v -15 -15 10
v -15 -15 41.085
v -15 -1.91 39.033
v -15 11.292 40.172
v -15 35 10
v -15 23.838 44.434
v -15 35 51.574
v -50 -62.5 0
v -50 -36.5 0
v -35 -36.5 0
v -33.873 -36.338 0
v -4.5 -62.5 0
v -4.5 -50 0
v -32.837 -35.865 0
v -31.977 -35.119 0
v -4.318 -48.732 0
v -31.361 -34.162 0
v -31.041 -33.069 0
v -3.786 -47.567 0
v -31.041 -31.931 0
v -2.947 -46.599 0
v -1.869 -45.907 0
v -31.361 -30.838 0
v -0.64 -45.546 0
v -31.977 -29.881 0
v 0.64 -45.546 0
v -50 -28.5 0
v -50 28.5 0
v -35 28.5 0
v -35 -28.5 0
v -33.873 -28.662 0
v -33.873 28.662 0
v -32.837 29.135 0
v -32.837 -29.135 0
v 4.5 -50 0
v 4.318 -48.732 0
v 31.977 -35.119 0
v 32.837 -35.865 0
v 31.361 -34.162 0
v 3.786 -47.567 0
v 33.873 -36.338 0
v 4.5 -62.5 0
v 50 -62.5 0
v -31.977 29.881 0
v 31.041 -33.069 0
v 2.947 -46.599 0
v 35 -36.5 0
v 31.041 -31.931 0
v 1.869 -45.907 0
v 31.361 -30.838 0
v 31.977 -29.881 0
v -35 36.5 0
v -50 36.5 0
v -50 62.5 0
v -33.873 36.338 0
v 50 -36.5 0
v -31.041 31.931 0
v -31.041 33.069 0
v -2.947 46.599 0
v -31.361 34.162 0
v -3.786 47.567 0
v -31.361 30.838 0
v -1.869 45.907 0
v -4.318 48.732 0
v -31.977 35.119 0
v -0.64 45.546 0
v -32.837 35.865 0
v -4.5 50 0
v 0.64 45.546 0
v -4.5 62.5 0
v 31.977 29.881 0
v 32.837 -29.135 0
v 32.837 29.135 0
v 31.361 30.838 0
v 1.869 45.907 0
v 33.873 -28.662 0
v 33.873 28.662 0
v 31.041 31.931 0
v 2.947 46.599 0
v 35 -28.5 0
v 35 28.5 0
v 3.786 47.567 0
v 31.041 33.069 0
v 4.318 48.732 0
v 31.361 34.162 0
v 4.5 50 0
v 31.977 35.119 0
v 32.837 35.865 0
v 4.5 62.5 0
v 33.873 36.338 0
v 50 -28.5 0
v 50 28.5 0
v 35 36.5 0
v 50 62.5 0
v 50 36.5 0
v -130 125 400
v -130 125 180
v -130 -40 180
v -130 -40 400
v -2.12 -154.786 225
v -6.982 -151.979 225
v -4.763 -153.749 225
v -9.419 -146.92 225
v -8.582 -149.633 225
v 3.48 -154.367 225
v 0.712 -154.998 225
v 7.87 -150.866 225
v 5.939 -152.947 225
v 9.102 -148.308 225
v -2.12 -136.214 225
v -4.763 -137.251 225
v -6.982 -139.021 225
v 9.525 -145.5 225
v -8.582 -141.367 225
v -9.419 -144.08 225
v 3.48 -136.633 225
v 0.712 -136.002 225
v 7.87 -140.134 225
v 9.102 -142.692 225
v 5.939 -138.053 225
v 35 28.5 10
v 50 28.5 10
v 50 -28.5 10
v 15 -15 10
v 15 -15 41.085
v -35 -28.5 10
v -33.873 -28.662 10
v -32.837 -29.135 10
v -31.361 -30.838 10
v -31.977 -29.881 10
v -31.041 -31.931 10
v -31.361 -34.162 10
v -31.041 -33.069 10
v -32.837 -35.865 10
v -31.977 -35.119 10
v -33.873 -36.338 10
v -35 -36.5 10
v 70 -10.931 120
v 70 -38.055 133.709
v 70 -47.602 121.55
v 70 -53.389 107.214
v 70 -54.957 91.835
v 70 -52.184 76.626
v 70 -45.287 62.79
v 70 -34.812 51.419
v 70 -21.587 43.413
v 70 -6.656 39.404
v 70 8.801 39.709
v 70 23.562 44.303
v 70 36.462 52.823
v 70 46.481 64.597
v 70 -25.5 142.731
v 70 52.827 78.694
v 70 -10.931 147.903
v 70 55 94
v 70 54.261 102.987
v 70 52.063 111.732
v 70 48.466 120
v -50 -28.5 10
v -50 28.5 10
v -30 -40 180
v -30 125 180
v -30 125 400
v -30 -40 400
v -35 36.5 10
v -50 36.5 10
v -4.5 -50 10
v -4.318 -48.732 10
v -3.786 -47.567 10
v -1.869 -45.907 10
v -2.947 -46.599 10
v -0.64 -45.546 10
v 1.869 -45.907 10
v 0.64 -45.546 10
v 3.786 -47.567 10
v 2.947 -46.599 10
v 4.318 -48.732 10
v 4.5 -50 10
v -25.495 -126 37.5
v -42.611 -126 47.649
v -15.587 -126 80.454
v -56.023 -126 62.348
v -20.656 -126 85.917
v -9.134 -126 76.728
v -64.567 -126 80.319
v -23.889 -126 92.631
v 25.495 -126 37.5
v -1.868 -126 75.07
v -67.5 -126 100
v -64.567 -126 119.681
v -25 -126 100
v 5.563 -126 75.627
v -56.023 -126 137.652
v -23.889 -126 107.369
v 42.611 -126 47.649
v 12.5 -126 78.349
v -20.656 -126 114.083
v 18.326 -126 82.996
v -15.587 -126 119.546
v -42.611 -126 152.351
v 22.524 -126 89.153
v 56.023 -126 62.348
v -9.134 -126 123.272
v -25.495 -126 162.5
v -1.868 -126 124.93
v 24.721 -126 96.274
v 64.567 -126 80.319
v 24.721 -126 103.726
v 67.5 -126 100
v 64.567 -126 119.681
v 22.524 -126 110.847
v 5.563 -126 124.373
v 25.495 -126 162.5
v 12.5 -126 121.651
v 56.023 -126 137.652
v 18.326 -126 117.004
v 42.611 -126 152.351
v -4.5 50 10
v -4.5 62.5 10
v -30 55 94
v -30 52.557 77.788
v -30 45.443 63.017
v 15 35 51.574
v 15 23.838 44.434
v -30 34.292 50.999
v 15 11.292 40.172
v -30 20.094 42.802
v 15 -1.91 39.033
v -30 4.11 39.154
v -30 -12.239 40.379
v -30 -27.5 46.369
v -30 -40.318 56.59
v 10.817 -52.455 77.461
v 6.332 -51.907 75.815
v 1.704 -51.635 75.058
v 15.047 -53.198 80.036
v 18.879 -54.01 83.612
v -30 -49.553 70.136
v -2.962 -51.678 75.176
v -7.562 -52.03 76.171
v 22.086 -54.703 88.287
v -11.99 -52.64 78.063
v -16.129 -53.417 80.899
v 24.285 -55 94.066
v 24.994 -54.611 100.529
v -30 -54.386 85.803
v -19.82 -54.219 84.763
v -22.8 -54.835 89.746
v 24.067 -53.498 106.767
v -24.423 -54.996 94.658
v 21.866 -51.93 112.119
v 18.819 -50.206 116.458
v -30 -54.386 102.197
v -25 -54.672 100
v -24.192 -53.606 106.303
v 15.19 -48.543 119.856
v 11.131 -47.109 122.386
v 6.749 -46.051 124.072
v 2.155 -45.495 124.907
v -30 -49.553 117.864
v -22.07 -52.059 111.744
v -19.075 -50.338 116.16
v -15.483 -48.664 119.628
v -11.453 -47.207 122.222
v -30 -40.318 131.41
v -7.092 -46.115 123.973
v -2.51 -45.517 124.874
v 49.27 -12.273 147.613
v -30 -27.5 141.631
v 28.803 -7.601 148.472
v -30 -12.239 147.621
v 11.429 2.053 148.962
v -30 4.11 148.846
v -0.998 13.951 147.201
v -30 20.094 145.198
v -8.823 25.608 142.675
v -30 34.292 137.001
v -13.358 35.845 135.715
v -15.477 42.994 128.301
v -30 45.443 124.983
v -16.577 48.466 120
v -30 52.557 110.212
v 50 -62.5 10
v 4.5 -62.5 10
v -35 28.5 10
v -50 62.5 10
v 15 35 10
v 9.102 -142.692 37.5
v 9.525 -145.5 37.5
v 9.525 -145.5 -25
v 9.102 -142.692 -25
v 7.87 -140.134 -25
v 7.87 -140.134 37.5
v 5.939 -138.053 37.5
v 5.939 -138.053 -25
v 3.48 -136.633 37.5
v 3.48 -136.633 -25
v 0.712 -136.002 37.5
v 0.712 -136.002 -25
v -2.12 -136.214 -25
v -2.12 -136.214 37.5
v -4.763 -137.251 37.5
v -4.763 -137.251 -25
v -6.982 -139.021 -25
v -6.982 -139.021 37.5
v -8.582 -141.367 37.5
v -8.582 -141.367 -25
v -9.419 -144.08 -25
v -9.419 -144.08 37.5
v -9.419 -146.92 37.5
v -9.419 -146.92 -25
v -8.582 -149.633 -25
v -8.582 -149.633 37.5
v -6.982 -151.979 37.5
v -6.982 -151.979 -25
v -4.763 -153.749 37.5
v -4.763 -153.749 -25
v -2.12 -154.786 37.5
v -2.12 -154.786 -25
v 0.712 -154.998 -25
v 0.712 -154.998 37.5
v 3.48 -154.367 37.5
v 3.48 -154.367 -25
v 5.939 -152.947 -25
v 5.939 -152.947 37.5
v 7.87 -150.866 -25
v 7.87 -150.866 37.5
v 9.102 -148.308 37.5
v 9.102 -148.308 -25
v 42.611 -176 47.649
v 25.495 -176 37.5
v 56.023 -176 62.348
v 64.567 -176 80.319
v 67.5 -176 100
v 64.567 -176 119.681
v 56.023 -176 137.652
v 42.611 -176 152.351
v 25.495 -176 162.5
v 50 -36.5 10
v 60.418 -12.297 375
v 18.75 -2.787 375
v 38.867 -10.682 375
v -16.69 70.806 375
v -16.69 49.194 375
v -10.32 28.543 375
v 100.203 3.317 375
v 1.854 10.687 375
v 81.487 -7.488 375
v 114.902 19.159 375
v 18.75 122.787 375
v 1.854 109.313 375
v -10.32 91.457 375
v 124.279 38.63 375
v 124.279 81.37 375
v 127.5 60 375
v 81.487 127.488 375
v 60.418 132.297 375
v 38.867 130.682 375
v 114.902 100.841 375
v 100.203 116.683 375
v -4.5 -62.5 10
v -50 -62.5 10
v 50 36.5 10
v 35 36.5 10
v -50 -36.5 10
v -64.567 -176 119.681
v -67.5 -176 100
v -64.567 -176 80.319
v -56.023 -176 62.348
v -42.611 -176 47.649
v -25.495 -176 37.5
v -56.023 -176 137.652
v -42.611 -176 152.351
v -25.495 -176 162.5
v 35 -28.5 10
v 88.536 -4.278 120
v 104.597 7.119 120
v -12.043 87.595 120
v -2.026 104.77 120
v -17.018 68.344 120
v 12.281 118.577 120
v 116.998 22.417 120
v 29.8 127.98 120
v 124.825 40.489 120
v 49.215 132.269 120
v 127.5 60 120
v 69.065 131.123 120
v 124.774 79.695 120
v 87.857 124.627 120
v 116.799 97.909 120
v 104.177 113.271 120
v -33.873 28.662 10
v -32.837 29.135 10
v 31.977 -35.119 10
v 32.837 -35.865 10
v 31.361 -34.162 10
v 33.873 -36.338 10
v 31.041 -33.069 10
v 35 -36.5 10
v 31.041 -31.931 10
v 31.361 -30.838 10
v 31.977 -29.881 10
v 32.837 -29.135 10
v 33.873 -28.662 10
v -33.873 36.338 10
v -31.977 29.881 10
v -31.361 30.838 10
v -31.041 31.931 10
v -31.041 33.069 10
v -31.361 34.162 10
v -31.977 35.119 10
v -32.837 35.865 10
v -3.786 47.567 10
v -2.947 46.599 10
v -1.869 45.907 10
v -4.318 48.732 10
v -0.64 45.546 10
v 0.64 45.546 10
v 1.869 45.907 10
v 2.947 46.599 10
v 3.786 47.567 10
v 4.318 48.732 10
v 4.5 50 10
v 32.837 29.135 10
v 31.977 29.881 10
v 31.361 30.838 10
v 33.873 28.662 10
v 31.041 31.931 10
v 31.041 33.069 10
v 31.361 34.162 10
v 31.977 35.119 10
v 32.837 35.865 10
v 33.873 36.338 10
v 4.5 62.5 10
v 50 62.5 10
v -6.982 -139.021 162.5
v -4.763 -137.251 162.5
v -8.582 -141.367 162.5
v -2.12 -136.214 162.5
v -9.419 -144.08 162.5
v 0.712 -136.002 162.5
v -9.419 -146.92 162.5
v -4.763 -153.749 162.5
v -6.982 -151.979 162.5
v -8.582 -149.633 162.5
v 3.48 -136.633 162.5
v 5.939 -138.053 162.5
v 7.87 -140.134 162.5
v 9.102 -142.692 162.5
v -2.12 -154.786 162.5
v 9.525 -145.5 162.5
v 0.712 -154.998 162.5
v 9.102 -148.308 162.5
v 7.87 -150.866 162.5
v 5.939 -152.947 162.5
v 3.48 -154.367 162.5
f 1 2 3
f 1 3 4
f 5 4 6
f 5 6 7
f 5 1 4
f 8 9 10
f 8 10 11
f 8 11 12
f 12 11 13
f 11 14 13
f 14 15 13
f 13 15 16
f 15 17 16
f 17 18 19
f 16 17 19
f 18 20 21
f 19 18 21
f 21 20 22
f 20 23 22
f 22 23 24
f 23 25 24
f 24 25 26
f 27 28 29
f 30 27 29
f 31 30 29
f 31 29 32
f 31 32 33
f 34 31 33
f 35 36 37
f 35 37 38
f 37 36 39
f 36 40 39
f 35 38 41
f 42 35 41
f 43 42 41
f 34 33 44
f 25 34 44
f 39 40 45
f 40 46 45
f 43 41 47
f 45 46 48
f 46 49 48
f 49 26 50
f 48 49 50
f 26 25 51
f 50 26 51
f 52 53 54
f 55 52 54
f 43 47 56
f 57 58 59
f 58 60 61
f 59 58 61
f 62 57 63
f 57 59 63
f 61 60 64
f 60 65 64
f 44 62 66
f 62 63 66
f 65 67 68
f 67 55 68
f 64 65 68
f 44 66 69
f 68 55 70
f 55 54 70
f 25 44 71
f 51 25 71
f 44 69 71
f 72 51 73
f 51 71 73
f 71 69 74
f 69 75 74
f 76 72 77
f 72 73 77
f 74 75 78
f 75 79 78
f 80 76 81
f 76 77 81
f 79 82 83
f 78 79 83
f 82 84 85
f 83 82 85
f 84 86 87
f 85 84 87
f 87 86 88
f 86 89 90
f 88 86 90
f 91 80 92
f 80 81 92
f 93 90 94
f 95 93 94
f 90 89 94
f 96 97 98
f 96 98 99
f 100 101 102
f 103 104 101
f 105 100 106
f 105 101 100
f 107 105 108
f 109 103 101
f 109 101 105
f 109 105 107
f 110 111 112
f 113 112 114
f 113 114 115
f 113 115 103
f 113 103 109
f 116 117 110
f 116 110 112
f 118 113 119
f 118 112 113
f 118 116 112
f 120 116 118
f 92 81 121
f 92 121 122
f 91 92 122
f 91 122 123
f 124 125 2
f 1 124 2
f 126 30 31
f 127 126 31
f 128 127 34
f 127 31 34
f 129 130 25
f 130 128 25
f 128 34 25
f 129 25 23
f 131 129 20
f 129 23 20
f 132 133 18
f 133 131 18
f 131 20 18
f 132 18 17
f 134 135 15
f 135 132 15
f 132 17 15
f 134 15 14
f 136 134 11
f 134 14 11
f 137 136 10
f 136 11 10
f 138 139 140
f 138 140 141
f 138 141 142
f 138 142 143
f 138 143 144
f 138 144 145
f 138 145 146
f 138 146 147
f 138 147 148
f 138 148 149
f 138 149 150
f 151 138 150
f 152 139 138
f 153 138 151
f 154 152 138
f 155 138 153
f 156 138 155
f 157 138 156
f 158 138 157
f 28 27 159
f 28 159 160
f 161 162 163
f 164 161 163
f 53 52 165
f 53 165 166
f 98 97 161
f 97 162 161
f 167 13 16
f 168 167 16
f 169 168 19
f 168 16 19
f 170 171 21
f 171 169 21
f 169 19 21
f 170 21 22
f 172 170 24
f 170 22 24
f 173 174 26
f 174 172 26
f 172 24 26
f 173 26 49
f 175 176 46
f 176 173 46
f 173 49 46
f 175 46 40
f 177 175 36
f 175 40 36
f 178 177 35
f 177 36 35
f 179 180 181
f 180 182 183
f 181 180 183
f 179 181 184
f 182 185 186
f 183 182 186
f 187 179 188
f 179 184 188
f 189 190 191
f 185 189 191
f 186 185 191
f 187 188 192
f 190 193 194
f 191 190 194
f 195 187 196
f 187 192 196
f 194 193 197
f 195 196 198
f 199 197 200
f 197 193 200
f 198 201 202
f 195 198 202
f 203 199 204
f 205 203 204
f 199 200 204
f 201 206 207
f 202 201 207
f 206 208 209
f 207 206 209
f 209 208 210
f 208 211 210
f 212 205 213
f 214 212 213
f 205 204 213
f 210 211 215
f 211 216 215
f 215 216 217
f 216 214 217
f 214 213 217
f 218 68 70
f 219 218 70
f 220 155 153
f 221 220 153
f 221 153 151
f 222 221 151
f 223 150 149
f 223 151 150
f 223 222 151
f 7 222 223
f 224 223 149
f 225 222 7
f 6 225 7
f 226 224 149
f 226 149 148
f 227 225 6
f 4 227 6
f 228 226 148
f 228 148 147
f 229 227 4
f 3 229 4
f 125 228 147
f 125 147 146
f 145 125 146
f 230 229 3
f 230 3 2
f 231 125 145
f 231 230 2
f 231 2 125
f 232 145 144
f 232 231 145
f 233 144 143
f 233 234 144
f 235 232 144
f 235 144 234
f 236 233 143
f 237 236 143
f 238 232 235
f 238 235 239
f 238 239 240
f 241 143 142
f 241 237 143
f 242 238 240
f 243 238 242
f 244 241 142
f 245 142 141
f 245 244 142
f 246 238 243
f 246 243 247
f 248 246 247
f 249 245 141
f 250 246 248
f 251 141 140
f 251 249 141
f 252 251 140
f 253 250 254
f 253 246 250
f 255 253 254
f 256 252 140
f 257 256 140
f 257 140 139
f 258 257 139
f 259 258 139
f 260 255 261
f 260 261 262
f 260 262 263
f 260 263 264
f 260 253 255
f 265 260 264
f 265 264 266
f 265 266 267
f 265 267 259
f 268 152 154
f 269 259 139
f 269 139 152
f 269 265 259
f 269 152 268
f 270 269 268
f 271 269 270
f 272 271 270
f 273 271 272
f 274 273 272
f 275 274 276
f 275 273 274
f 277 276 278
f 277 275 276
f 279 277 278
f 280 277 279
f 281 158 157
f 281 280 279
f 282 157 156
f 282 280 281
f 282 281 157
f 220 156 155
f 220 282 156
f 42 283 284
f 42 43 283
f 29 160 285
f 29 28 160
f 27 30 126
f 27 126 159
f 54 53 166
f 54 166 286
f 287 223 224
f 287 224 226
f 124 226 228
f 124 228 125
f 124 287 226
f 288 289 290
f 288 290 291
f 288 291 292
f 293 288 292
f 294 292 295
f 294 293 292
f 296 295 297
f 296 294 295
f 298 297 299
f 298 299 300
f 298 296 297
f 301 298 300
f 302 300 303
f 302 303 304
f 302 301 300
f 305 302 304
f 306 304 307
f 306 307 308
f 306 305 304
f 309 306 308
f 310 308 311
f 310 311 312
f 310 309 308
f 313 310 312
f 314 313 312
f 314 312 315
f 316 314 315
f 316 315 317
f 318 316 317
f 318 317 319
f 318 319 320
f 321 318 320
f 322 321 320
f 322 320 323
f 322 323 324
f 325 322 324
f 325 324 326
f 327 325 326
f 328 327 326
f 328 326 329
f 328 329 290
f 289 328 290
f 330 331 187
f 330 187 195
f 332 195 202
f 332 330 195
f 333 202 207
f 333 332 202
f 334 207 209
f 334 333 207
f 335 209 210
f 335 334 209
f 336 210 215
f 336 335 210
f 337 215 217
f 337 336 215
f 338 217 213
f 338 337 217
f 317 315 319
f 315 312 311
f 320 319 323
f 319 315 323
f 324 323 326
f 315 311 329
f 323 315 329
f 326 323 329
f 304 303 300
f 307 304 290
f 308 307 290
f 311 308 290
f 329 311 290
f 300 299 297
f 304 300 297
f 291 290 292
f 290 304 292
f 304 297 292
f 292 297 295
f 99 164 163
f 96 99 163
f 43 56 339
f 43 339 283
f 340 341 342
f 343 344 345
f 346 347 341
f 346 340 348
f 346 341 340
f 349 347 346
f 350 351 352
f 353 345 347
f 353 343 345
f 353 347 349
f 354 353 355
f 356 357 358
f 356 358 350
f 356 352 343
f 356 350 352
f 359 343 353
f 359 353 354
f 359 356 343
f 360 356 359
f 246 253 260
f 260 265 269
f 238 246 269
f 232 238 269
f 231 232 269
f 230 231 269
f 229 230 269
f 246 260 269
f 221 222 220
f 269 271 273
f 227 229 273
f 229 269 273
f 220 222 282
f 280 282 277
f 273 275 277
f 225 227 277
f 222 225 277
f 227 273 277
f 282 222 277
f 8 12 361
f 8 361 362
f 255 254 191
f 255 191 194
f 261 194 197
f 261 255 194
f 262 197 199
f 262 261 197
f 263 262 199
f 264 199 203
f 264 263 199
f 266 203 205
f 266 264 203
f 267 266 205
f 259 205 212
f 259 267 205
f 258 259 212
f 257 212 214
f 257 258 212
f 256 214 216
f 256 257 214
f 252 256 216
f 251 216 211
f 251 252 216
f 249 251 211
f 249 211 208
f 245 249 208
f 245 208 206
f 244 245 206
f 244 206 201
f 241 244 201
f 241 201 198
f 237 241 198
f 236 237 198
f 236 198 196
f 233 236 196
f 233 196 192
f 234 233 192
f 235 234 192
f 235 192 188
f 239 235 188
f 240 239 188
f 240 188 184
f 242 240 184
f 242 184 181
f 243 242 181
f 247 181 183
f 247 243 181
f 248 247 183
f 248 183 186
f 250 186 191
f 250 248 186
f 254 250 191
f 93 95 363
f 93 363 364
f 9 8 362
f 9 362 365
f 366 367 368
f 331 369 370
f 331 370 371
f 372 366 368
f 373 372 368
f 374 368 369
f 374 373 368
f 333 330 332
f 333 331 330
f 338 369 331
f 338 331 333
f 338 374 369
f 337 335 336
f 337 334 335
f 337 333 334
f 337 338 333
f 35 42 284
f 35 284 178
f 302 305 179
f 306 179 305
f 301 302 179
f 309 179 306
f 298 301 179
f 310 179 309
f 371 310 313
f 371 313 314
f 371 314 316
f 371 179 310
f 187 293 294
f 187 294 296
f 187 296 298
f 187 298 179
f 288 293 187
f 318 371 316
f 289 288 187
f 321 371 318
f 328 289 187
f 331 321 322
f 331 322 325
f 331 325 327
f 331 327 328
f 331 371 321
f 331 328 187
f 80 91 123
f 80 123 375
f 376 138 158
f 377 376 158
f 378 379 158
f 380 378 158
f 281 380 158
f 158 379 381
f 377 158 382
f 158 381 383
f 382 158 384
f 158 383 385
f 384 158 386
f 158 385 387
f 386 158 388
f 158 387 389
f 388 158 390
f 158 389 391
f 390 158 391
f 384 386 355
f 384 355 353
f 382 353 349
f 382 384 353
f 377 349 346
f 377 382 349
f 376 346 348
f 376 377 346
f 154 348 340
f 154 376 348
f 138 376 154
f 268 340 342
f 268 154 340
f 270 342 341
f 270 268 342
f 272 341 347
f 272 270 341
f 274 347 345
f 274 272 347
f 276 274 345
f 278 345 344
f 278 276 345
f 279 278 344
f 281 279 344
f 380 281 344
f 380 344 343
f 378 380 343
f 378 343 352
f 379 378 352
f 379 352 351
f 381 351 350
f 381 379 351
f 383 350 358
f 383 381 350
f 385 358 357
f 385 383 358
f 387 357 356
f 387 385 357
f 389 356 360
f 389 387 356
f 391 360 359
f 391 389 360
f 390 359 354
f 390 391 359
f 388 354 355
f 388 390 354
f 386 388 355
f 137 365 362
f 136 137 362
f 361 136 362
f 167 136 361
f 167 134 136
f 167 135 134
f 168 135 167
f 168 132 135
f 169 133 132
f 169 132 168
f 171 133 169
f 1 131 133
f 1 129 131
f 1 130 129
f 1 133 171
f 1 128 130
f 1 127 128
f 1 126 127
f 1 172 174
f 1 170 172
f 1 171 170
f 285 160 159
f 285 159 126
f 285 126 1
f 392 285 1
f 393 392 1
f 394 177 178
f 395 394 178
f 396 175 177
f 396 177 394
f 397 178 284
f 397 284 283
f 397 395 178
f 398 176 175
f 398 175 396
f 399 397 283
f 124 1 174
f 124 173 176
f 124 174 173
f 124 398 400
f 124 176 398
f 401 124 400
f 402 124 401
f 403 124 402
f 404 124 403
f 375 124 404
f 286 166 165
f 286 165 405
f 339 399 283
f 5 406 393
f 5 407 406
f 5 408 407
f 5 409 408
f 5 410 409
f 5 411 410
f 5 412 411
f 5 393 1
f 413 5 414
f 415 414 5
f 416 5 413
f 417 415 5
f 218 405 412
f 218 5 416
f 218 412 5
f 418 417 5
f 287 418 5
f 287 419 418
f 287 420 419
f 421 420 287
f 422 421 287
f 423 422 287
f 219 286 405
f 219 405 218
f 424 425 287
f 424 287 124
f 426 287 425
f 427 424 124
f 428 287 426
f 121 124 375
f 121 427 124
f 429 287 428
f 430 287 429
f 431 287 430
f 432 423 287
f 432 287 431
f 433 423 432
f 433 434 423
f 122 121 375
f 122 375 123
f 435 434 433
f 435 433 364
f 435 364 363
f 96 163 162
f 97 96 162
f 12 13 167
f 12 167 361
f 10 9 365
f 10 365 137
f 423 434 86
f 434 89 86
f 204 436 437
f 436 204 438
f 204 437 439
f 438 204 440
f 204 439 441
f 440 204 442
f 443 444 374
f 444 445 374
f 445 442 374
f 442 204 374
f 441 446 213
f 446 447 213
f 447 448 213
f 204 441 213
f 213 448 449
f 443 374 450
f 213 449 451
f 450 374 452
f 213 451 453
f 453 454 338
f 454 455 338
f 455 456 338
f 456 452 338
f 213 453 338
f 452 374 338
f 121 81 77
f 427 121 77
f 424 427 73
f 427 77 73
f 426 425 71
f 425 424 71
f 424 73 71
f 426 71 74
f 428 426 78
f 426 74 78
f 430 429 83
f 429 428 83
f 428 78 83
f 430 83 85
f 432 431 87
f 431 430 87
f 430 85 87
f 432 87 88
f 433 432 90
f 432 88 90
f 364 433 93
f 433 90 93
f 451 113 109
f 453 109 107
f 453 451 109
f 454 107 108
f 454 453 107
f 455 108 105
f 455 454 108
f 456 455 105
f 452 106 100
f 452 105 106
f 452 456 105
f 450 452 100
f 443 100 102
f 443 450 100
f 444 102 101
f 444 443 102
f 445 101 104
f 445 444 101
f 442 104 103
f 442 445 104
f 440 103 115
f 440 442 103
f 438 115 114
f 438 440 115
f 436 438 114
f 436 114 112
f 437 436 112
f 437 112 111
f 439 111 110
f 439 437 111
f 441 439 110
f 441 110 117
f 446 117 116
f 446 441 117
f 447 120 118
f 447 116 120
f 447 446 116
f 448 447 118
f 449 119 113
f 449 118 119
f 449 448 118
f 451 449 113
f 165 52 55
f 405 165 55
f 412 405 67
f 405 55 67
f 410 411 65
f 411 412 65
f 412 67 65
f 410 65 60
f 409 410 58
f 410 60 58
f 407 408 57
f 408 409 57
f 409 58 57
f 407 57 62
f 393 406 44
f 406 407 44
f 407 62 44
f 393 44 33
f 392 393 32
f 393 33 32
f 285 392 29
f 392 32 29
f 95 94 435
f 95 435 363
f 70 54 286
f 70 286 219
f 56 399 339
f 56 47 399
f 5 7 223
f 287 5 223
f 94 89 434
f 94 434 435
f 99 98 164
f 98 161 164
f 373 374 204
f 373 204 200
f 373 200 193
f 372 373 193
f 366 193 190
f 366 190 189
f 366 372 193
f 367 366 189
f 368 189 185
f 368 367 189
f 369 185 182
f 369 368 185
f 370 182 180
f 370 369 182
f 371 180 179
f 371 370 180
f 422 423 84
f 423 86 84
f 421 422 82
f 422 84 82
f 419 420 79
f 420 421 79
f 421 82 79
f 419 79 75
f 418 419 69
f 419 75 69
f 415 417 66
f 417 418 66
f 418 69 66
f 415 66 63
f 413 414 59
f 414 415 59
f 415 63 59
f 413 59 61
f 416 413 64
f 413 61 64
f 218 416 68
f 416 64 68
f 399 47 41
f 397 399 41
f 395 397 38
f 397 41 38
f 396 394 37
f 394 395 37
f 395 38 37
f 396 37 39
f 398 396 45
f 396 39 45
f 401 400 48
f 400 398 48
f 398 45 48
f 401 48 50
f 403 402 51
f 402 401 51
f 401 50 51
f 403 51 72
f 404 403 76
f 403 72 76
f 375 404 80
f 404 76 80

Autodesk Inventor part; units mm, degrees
ref_plane "YZ Plane" through (0, 0, 0) normal (1, 0, 0) x (0, 1, 0)
ref_plane "XZ Plane" through (0, 0, 0) normal (0, 1, 0) x (-1, 0, 0)
sketch "Sketch1" plane through (0, 0, 0) normal (0, 0, 1) x (1, 0, 0)
  line L0 (-50, 62.5) -> (50, 62.5)
  line L1 (50, 62.5) -> (50, -62.5)
  line L2 (50, -62.5) -> (-50, -62.5)
  line L3 (-50, -62.5) -> (-50, 62.5)
  line L4 (-50, 62.5) -> (50, -62.5) construction
  line L5 (50, 62.5) -> (-50, -62.5) construction
  line L6 (50, 36.5) -> (35, 36.5)
  arc A0 (35, 36.5) -> (35, 28.5) centre (35, 32.5) ccw
  line L7 (35, 28.5) -> (50, 28.5)
  line L8 (50, -28.5) -> (35, -28.5)
  arc A1 (35, -28.5) -> (35, -36.5) centre (35, -32.5) ccw
  line L9 (35, -36.5) -> (50, -36.5)
  line L10 (4.5, 62.5) -> (4.5, 50)
  arc A2 (-4.5, 50) -> (4.5, 50) centre (0, 50) ccw
  line L11 (-4.5, 50) -> (-4.5, 62.5)
  line L12 (4.5, -62.5) -> (4.5, -50)
  arc A3 (4.5, -50) -> (-4.5, -50) centre (0, -50) ccw
  line L13 (-4.5, -50) -> (-4.5, -62.5)
  line L14 (-50, -36.5) -> (-35, -36.5)
  arc A4 (-35, -36.5) -> (-35, -28.5) centre (-35, -32.5) ccw
  line L15 (-35, -28.5) -> (-50, -28.5)
  line L16 (-50, 28.5) -> (-35, 28.5)
  arc A5 (-35, 28.5) -> (-35, 36.5) centre (-35, 32.5) ccw
  line L17 (-35, 36.5) -> (-50, 36.5)
  line L18 (50, 0) -> (-50, 0) construction
  point P0 (0, 0)
  point P1 (0, 0)
  dimension "d0" = 100
  dimension "d1" = 125
  dimension "d2" = 4
  dimension "d3" = 65
  dimension "d4" = 15
  dimension "d5" = 4.5
  dimension "d6" = 12.5
  dimension "d39" = 70
  dimension "d40" = 100
extrude "Extrusion1" add sketch "Sketch1" along normal blind 10 contours L0 L11 A2 L10 L1 L6 A0 L7 L8 A1 L9 L2 L12 A3 L13 L3 L14 A4 L15 L16 A5 L17
sketch "Sketch3" plane through (0, 0, 0) normal (0, 0, 1) x (1, 0, 0)
  line L0 (-15, 35) -> (15, 35)
  line L1 (15, 35) -> (15, -15)
  line L2 (15, -15) -> (-15, -15)
  line L3 (-15, -15) -> (-15, 35)
  point P0 (0, 0)
  point P1 (0, -15)
  dimension "d9" = 30
  dimension "d10" = 50
  dimension "d11" = 15
extrude "Extrusion2" add sketch "Sketch3" along normal blind 120
sketch "Sketch4" plane through (0, 0, 0) normal (1, 0, 0) x (0, 1, 0)
  circle A0 centre (0, 94) radius 55
  line L0 (28.5, 0) -> (-28.5, 0) projected
  point P0 (0, 0)
  point P1 (0, 0)
  point P2 (0, 0)
  dimension "d14" = 94
  dimension "d15" = 110
  dimension "d16" = 0
extrude "Extrusion3" add sketch "Sketch4" along normal blind 70 and the other way blind 30
sketch "Sketch5" plane through (0, 0, 120) normal (0, 0, 1) x (1, 0, 0)
  circle A0 centre (55, 60) radius 72.5
  point P0 (0, 0)
  dimension "d21" = 145
  dimension "d22" = 55
  dimension "d23" = 60
extrude "Extrusion4" add sketch "Sketch5" along normal blind 255
sketch "Sketch6" plane through (0, 0, 0) normal (0, 1, 0) x (-1, 0, 0)
  circle A0 centre (0, 100) radius 25
  point P0 (0, 0)
  dimension "d26" = 50
  dimension "d27" = 100
extrude "Extrusion5" add sketch "Sketch6" against normal blind 176
sketch "Sketch7" plane through (0, -176, 100) normal (0, -1, 0) x (1, 0, 0)
  circle A0 centre (0, 0) radius 67.5
  line L0 (-25.4951, 62.5) -> (25.4951, 62.5)
  line L1 (-25.4951, -62.5) -> (25.4951, -62.5)
  circle A1 centre (0, 0) radius 25 construction
  line L2 (0, 0) -> (67.5, 0) construction
  point P0 (0, -100)
  dimension "d30" = 135
  dimension "d31" = 125
extrude "Extrusion6" add sketch "Sketch7" against normal blind 50 contours A0 L1 L0
ref_plane "Work Plane1" through (0, 0, 100) normal (0, 0, 1) x (1, 0, 0)
sketch "Sketch8" plane through (0, 0, 100) normal (0, 0, 1) x (1, 0, 0)
  circle A0 centre (0, -145.5) radius 9.525
  point P0 (0, 0)
  dimension "d35" = 19.05
  dimension "d36" = 145.5
extrude "Extrusion7" add sketch "Sketch8" along normal mid plane 250
sketch "Sketch9" plane through (-30, 0, 94) normal (-1, 0, 0) x (0, 0, 1)
  line L0 (306, 125) -> (86, 125)
  line L1 (86, 125) -> (86, -40)
  line L2 (86, -40) -> (306, -40)
  line L3 (306, -40) -> (306, 125)
  line L4 (-94, 28.5) -> (-94, -28.5) projected
  point P0 (-94, 0)
  point P1 (-94, 0)
  point P2 (-94, 0)
  dimension "d41" = 165
  dimension "d42" = 220
  dimension "d43" = 180
  dimension "d44" = 40
extrude "Extrusion8" add sketch "Sketch9" along normal blind 100
properties part number "Spring MS1 Elektra"
